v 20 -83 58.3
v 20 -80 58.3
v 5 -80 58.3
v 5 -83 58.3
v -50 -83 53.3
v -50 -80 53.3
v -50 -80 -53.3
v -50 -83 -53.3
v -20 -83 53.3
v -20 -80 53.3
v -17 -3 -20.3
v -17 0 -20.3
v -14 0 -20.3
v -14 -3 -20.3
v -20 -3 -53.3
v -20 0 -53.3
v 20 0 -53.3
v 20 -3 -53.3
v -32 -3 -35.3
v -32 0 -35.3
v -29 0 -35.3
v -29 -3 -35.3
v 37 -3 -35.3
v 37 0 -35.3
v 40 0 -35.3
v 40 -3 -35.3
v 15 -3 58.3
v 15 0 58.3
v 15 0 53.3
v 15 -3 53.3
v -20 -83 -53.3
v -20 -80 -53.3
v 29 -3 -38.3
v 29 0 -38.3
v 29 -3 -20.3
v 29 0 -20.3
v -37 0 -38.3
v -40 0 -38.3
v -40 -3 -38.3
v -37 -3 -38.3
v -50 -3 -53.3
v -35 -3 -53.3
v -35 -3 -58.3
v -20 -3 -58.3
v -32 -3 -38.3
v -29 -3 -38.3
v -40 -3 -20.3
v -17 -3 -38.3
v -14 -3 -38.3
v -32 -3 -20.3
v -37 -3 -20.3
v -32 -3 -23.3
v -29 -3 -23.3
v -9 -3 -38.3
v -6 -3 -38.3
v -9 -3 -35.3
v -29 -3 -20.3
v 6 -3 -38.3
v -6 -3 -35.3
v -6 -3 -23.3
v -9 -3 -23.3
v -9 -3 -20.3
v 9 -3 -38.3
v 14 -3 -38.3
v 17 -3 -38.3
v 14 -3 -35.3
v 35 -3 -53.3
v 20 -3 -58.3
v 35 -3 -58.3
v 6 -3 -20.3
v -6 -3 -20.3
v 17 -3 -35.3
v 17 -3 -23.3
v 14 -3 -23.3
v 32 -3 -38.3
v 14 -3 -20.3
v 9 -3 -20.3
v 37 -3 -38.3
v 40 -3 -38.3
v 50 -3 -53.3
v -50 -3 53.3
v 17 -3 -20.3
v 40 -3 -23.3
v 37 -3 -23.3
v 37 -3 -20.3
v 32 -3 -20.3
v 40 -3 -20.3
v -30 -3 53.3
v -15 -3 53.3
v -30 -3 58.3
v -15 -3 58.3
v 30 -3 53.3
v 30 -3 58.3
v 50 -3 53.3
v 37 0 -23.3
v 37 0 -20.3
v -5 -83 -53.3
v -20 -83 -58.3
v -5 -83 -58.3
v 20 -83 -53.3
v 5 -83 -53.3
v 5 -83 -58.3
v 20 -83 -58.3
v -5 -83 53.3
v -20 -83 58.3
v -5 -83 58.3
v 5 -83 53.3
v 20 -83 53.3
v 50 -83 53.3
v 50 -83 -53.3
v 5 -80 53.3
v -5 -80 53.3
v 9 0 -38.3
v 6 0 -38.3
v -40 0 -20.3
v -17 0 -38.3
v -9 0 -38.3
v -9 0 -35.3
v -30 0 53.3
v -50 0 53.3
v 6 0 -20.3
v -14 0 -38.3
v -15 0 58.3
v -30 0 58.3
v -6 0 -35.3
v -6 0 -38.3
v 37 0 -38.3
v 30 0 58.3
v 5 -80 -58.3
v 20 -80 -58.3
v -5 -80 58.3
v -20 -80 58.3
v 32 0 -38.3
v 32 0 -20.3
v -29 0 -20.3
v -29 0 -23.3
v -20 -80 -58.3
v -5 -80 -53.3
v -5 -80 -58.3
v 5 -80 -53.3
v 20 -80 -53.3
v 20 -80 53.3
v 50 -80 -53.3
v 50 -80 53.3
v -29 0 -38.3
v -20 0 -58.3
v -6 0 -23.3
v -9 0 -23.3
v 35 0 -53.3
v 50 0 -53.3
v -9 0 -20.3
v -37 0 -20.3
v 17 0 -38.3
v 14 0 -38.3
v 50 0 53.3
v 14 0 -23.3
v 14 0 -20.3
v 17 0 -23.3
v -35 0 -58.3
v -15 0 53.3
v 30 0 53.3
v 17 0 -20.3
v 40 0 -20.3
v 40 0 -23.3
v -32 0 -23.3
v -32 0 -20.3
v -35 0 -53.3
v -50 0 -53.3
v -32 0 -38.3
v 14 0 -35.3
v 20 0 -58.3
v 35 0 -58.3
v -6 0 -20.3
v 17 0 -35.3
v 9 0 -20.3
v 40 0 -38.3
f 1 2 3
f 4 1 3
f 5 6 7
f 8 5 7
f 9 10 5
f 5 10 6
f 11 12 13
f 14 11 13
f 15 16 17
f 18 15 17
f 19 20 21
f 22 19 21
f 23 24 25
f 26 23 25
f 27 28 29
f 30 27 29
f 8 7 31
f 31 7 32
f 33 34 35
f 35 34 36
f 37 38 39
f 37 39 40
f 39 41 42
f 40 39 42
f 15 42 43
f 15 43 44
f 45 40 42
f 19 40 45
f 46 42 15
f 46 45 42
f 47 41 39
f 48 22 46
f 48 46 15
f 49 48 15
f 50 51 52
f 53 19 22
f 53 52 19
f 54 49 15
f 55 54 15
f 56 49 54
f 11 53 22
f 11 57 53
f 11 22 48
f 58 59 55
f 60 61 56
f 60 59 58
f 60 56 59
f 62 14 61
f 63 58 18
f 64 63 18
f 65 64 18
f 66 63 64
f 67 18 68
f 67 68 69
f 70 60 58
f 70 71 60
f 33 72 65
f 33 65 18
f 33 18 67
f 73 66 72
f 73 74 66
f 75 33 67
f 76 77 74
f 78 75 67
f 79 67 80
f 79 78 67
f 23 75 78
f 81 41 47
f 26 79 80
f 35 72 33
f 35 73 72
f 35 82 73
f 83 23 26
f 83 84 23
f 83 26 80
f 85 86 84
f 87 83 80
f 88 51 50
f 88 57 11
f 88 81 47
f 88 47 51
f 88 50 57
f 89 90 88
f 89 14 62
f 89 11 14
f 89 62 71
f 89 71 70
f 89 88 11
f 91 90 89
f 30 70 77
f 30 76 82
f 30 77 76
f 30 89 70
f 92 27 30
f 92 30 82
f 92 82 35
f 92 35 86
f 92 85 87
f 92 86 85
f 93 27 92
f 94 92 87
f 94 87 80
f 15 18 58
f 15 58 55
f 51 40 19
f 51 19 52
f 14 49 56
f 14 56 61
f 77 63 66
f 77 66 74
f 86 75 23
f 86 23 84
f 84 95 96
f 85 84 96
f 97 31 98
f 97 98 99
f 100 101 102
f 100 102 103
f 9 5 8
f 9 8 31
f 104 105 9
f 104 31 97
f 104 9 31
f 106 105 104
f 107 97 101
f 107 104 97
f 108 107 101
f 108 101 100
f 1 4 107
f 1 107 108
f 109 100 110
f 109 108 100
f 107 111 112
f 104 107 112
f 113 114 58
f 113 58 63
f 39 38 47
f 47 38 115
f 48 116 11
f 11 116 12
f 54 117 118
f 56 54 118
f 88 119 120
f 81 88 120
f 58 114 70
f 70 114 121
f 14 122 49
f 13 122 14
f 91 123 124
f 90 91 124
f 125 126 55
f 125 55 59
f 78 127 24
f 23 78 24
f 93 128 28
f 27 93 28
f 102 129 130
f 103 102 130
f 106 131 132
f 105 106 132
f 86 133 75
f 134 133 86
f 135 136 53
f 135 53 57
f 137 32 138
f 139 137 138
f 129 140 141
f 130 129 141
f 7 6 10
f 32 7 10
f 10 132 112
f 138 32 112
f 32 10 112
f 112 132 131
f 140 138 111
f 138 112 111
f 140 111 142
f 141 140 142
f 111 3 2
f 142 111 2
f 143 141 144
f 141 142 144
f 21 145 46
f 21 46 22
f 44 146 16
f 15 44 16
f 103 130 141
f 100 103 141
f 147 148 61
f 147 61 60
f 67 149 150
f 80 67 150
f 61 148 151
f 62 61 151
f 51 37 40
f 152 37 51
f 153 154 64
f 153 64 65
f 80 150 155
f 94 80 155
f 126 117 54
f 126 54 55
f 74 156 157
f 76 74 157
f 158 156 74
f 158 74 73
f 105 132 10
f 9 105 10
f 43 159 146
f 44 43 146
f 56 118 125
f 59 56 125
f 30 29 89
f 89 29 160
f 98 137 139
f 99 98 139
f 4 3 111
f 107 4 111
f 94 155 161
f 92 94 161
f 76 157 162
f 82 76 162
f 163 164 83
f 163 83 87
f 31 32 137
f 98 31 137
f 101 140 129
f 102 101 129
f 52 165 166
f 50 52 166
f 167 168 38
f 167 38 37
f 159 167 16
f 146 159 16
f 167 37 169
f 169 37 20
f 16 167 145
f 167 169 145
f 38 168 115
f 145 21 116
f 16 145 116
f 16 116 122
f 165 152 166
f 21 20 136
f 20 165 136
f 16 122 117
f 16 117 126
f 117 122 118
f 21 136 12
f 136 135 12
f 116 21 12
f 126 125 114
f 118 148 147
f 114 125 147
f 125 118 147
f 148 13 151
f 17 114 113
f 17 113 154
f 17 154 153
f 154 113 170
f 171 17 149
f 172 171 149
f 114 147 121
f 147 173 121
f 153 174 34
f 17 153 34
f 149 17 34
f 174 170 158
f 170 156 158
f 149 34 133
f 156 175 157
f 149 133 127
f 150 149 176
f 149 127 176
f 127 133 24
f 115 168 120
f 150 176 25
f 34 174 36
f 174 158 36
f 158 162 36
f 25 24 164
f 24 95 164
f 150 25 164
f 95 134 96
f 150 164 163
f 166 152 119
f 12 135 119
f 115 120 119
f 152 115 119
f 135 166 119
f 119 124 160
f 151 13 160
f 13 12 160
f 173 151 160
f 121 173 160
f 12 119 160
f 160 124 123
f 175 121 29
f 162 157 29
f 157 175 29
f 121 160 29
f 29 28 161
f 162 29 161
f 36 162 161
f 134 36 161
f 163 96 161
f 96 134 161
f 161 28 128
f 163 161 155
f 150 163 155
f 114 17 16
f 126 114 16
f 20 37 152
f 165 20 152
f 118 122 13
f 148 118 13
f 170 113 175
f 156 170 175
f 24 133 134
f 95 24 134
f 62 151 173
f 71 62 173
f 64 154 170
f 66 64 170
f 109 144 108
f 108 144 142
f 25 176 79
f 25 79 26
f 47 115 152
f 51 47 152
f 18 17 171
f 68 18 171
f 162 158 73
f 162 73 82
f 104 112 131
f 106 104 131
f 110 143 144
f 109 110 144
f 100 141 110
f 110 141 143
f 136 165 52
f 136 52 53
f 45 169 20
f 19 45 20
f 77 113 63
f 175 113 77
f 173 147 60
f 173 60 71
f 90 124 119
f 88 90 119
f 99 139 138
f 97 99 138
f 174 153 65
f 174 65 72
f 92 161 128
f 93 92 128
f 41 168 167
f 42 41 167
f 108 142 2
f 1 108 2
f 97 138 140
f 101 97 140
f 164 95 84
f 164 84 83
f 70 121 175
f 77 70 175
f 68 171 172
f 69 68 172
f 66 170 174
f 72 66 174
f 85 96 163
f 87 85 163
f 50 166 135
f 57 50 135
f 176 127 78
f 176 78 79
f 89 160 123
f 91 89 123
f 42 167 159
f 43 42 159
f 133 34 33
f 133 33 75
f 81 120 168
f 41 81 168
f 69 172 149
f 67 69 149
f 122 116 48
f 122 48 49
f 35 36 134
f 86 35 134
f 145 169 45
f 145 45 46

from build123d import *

# Parameters (mm, degrees)
F0_W     = 3
F0_H     = 3
F0_H_2   = 18
F1_DEPTH = 3
F4_DEPTH = 3


with BuildPart() as f1:
    # F0 (on Front) → F1 (new body)
    with BuildSketch(Plane.XZ):
        Polygon((-30, 53.3), (-50, 53.3), (-50, -53.3), (-35, -53.3), (-35, -58.3), (-20, -58.3), (-20, -53.3), (20, -53.3), (20, -58.3), (35, -58.3), (35, -53.3), (50, -53.3), (50, 53.3), (30, 53.3), (30, 58.3), (15, 58.3), (15, 53.3), (-15, 53.3), (-15, 58.3), (-30, 58.3), align=None)
        with Locations((-30.5, -36.8)):
            Rectangle(F0_W, F0_H, mode=Mode.SUBTRACT)
        with Locations((-7.5, -36.8)):
            Rectangle(F0_W, F0_H, mode=Mode.SUBTRACT)
        with Locations((-38.5, -29.3)):
            Rectangle(F0_W, F0_H_2, mode=Mode.SUBTRACT)
        with Locations((-15.5, -29.3)):
            Rectangle(F0_W, F0_H_2, mode=Mode.SUBTRACT)
        with Locations((15.5, -36.8)):
            Rectangle(F0_W, F0_H, mode=Mode.SUBTRACT)
        with Locations((38.5, -36.8)):
            Rectangle(F0_W, F0_H, mode=Mode.SUBTRACT)
        with Locations((7.5, -29.3)):
            Rectangle(F0_W, F0_H_2, mode=Mode.SUBTRACT)
        with Locations((30.5, -29.3)):
            Rectangle(F0_W, F0_H_2, mode=Mode.SUBTRACT)
        with Locations((-30.5, -21.8)):
            Rectangle(F0_W, F0_H, mode=Mode.SUBTRACT)
        with Locations((-7.5, -21.8)):
            Rectangle(F0_W, F0_H, mode=Mode.SUBTRACT)
        with Locations((15.5, -21.8)):
            Rectangle(F0_W, F0_H, mode=Mode.SUBTRACT)
        with Locations((38.5, -21.8)):
            Rectangle(F0_W, F0_H, mode=Mode.SUBTRACT)
    extrude(amount=F1_DEPTH)


with BuildPart() as f4:
    # F3 (on offset) → F4 (new body)
    with BuildSketch(Plane.XZ.offset(80)):
        Polygon((-20, 53.3), (-50, 53.3), (-50, -53.3), (-20, -53.3), (-20, -58.3), (-5, -58.3), (-5, -53.3), (5, -53.3), (5, -58.3), (20, -58.3), (20, -53.3), (50, -53.3), (50, 53.3), (20, 53.3), (20, 58.3), (5, 58.3), (5, 53.3), (-5, 53.3), (-5, 58.3), (-20, 58.3), align=None)
    extrude(amount=F4_DEPTH)


solid = Compound([f1.part, f4.part])
